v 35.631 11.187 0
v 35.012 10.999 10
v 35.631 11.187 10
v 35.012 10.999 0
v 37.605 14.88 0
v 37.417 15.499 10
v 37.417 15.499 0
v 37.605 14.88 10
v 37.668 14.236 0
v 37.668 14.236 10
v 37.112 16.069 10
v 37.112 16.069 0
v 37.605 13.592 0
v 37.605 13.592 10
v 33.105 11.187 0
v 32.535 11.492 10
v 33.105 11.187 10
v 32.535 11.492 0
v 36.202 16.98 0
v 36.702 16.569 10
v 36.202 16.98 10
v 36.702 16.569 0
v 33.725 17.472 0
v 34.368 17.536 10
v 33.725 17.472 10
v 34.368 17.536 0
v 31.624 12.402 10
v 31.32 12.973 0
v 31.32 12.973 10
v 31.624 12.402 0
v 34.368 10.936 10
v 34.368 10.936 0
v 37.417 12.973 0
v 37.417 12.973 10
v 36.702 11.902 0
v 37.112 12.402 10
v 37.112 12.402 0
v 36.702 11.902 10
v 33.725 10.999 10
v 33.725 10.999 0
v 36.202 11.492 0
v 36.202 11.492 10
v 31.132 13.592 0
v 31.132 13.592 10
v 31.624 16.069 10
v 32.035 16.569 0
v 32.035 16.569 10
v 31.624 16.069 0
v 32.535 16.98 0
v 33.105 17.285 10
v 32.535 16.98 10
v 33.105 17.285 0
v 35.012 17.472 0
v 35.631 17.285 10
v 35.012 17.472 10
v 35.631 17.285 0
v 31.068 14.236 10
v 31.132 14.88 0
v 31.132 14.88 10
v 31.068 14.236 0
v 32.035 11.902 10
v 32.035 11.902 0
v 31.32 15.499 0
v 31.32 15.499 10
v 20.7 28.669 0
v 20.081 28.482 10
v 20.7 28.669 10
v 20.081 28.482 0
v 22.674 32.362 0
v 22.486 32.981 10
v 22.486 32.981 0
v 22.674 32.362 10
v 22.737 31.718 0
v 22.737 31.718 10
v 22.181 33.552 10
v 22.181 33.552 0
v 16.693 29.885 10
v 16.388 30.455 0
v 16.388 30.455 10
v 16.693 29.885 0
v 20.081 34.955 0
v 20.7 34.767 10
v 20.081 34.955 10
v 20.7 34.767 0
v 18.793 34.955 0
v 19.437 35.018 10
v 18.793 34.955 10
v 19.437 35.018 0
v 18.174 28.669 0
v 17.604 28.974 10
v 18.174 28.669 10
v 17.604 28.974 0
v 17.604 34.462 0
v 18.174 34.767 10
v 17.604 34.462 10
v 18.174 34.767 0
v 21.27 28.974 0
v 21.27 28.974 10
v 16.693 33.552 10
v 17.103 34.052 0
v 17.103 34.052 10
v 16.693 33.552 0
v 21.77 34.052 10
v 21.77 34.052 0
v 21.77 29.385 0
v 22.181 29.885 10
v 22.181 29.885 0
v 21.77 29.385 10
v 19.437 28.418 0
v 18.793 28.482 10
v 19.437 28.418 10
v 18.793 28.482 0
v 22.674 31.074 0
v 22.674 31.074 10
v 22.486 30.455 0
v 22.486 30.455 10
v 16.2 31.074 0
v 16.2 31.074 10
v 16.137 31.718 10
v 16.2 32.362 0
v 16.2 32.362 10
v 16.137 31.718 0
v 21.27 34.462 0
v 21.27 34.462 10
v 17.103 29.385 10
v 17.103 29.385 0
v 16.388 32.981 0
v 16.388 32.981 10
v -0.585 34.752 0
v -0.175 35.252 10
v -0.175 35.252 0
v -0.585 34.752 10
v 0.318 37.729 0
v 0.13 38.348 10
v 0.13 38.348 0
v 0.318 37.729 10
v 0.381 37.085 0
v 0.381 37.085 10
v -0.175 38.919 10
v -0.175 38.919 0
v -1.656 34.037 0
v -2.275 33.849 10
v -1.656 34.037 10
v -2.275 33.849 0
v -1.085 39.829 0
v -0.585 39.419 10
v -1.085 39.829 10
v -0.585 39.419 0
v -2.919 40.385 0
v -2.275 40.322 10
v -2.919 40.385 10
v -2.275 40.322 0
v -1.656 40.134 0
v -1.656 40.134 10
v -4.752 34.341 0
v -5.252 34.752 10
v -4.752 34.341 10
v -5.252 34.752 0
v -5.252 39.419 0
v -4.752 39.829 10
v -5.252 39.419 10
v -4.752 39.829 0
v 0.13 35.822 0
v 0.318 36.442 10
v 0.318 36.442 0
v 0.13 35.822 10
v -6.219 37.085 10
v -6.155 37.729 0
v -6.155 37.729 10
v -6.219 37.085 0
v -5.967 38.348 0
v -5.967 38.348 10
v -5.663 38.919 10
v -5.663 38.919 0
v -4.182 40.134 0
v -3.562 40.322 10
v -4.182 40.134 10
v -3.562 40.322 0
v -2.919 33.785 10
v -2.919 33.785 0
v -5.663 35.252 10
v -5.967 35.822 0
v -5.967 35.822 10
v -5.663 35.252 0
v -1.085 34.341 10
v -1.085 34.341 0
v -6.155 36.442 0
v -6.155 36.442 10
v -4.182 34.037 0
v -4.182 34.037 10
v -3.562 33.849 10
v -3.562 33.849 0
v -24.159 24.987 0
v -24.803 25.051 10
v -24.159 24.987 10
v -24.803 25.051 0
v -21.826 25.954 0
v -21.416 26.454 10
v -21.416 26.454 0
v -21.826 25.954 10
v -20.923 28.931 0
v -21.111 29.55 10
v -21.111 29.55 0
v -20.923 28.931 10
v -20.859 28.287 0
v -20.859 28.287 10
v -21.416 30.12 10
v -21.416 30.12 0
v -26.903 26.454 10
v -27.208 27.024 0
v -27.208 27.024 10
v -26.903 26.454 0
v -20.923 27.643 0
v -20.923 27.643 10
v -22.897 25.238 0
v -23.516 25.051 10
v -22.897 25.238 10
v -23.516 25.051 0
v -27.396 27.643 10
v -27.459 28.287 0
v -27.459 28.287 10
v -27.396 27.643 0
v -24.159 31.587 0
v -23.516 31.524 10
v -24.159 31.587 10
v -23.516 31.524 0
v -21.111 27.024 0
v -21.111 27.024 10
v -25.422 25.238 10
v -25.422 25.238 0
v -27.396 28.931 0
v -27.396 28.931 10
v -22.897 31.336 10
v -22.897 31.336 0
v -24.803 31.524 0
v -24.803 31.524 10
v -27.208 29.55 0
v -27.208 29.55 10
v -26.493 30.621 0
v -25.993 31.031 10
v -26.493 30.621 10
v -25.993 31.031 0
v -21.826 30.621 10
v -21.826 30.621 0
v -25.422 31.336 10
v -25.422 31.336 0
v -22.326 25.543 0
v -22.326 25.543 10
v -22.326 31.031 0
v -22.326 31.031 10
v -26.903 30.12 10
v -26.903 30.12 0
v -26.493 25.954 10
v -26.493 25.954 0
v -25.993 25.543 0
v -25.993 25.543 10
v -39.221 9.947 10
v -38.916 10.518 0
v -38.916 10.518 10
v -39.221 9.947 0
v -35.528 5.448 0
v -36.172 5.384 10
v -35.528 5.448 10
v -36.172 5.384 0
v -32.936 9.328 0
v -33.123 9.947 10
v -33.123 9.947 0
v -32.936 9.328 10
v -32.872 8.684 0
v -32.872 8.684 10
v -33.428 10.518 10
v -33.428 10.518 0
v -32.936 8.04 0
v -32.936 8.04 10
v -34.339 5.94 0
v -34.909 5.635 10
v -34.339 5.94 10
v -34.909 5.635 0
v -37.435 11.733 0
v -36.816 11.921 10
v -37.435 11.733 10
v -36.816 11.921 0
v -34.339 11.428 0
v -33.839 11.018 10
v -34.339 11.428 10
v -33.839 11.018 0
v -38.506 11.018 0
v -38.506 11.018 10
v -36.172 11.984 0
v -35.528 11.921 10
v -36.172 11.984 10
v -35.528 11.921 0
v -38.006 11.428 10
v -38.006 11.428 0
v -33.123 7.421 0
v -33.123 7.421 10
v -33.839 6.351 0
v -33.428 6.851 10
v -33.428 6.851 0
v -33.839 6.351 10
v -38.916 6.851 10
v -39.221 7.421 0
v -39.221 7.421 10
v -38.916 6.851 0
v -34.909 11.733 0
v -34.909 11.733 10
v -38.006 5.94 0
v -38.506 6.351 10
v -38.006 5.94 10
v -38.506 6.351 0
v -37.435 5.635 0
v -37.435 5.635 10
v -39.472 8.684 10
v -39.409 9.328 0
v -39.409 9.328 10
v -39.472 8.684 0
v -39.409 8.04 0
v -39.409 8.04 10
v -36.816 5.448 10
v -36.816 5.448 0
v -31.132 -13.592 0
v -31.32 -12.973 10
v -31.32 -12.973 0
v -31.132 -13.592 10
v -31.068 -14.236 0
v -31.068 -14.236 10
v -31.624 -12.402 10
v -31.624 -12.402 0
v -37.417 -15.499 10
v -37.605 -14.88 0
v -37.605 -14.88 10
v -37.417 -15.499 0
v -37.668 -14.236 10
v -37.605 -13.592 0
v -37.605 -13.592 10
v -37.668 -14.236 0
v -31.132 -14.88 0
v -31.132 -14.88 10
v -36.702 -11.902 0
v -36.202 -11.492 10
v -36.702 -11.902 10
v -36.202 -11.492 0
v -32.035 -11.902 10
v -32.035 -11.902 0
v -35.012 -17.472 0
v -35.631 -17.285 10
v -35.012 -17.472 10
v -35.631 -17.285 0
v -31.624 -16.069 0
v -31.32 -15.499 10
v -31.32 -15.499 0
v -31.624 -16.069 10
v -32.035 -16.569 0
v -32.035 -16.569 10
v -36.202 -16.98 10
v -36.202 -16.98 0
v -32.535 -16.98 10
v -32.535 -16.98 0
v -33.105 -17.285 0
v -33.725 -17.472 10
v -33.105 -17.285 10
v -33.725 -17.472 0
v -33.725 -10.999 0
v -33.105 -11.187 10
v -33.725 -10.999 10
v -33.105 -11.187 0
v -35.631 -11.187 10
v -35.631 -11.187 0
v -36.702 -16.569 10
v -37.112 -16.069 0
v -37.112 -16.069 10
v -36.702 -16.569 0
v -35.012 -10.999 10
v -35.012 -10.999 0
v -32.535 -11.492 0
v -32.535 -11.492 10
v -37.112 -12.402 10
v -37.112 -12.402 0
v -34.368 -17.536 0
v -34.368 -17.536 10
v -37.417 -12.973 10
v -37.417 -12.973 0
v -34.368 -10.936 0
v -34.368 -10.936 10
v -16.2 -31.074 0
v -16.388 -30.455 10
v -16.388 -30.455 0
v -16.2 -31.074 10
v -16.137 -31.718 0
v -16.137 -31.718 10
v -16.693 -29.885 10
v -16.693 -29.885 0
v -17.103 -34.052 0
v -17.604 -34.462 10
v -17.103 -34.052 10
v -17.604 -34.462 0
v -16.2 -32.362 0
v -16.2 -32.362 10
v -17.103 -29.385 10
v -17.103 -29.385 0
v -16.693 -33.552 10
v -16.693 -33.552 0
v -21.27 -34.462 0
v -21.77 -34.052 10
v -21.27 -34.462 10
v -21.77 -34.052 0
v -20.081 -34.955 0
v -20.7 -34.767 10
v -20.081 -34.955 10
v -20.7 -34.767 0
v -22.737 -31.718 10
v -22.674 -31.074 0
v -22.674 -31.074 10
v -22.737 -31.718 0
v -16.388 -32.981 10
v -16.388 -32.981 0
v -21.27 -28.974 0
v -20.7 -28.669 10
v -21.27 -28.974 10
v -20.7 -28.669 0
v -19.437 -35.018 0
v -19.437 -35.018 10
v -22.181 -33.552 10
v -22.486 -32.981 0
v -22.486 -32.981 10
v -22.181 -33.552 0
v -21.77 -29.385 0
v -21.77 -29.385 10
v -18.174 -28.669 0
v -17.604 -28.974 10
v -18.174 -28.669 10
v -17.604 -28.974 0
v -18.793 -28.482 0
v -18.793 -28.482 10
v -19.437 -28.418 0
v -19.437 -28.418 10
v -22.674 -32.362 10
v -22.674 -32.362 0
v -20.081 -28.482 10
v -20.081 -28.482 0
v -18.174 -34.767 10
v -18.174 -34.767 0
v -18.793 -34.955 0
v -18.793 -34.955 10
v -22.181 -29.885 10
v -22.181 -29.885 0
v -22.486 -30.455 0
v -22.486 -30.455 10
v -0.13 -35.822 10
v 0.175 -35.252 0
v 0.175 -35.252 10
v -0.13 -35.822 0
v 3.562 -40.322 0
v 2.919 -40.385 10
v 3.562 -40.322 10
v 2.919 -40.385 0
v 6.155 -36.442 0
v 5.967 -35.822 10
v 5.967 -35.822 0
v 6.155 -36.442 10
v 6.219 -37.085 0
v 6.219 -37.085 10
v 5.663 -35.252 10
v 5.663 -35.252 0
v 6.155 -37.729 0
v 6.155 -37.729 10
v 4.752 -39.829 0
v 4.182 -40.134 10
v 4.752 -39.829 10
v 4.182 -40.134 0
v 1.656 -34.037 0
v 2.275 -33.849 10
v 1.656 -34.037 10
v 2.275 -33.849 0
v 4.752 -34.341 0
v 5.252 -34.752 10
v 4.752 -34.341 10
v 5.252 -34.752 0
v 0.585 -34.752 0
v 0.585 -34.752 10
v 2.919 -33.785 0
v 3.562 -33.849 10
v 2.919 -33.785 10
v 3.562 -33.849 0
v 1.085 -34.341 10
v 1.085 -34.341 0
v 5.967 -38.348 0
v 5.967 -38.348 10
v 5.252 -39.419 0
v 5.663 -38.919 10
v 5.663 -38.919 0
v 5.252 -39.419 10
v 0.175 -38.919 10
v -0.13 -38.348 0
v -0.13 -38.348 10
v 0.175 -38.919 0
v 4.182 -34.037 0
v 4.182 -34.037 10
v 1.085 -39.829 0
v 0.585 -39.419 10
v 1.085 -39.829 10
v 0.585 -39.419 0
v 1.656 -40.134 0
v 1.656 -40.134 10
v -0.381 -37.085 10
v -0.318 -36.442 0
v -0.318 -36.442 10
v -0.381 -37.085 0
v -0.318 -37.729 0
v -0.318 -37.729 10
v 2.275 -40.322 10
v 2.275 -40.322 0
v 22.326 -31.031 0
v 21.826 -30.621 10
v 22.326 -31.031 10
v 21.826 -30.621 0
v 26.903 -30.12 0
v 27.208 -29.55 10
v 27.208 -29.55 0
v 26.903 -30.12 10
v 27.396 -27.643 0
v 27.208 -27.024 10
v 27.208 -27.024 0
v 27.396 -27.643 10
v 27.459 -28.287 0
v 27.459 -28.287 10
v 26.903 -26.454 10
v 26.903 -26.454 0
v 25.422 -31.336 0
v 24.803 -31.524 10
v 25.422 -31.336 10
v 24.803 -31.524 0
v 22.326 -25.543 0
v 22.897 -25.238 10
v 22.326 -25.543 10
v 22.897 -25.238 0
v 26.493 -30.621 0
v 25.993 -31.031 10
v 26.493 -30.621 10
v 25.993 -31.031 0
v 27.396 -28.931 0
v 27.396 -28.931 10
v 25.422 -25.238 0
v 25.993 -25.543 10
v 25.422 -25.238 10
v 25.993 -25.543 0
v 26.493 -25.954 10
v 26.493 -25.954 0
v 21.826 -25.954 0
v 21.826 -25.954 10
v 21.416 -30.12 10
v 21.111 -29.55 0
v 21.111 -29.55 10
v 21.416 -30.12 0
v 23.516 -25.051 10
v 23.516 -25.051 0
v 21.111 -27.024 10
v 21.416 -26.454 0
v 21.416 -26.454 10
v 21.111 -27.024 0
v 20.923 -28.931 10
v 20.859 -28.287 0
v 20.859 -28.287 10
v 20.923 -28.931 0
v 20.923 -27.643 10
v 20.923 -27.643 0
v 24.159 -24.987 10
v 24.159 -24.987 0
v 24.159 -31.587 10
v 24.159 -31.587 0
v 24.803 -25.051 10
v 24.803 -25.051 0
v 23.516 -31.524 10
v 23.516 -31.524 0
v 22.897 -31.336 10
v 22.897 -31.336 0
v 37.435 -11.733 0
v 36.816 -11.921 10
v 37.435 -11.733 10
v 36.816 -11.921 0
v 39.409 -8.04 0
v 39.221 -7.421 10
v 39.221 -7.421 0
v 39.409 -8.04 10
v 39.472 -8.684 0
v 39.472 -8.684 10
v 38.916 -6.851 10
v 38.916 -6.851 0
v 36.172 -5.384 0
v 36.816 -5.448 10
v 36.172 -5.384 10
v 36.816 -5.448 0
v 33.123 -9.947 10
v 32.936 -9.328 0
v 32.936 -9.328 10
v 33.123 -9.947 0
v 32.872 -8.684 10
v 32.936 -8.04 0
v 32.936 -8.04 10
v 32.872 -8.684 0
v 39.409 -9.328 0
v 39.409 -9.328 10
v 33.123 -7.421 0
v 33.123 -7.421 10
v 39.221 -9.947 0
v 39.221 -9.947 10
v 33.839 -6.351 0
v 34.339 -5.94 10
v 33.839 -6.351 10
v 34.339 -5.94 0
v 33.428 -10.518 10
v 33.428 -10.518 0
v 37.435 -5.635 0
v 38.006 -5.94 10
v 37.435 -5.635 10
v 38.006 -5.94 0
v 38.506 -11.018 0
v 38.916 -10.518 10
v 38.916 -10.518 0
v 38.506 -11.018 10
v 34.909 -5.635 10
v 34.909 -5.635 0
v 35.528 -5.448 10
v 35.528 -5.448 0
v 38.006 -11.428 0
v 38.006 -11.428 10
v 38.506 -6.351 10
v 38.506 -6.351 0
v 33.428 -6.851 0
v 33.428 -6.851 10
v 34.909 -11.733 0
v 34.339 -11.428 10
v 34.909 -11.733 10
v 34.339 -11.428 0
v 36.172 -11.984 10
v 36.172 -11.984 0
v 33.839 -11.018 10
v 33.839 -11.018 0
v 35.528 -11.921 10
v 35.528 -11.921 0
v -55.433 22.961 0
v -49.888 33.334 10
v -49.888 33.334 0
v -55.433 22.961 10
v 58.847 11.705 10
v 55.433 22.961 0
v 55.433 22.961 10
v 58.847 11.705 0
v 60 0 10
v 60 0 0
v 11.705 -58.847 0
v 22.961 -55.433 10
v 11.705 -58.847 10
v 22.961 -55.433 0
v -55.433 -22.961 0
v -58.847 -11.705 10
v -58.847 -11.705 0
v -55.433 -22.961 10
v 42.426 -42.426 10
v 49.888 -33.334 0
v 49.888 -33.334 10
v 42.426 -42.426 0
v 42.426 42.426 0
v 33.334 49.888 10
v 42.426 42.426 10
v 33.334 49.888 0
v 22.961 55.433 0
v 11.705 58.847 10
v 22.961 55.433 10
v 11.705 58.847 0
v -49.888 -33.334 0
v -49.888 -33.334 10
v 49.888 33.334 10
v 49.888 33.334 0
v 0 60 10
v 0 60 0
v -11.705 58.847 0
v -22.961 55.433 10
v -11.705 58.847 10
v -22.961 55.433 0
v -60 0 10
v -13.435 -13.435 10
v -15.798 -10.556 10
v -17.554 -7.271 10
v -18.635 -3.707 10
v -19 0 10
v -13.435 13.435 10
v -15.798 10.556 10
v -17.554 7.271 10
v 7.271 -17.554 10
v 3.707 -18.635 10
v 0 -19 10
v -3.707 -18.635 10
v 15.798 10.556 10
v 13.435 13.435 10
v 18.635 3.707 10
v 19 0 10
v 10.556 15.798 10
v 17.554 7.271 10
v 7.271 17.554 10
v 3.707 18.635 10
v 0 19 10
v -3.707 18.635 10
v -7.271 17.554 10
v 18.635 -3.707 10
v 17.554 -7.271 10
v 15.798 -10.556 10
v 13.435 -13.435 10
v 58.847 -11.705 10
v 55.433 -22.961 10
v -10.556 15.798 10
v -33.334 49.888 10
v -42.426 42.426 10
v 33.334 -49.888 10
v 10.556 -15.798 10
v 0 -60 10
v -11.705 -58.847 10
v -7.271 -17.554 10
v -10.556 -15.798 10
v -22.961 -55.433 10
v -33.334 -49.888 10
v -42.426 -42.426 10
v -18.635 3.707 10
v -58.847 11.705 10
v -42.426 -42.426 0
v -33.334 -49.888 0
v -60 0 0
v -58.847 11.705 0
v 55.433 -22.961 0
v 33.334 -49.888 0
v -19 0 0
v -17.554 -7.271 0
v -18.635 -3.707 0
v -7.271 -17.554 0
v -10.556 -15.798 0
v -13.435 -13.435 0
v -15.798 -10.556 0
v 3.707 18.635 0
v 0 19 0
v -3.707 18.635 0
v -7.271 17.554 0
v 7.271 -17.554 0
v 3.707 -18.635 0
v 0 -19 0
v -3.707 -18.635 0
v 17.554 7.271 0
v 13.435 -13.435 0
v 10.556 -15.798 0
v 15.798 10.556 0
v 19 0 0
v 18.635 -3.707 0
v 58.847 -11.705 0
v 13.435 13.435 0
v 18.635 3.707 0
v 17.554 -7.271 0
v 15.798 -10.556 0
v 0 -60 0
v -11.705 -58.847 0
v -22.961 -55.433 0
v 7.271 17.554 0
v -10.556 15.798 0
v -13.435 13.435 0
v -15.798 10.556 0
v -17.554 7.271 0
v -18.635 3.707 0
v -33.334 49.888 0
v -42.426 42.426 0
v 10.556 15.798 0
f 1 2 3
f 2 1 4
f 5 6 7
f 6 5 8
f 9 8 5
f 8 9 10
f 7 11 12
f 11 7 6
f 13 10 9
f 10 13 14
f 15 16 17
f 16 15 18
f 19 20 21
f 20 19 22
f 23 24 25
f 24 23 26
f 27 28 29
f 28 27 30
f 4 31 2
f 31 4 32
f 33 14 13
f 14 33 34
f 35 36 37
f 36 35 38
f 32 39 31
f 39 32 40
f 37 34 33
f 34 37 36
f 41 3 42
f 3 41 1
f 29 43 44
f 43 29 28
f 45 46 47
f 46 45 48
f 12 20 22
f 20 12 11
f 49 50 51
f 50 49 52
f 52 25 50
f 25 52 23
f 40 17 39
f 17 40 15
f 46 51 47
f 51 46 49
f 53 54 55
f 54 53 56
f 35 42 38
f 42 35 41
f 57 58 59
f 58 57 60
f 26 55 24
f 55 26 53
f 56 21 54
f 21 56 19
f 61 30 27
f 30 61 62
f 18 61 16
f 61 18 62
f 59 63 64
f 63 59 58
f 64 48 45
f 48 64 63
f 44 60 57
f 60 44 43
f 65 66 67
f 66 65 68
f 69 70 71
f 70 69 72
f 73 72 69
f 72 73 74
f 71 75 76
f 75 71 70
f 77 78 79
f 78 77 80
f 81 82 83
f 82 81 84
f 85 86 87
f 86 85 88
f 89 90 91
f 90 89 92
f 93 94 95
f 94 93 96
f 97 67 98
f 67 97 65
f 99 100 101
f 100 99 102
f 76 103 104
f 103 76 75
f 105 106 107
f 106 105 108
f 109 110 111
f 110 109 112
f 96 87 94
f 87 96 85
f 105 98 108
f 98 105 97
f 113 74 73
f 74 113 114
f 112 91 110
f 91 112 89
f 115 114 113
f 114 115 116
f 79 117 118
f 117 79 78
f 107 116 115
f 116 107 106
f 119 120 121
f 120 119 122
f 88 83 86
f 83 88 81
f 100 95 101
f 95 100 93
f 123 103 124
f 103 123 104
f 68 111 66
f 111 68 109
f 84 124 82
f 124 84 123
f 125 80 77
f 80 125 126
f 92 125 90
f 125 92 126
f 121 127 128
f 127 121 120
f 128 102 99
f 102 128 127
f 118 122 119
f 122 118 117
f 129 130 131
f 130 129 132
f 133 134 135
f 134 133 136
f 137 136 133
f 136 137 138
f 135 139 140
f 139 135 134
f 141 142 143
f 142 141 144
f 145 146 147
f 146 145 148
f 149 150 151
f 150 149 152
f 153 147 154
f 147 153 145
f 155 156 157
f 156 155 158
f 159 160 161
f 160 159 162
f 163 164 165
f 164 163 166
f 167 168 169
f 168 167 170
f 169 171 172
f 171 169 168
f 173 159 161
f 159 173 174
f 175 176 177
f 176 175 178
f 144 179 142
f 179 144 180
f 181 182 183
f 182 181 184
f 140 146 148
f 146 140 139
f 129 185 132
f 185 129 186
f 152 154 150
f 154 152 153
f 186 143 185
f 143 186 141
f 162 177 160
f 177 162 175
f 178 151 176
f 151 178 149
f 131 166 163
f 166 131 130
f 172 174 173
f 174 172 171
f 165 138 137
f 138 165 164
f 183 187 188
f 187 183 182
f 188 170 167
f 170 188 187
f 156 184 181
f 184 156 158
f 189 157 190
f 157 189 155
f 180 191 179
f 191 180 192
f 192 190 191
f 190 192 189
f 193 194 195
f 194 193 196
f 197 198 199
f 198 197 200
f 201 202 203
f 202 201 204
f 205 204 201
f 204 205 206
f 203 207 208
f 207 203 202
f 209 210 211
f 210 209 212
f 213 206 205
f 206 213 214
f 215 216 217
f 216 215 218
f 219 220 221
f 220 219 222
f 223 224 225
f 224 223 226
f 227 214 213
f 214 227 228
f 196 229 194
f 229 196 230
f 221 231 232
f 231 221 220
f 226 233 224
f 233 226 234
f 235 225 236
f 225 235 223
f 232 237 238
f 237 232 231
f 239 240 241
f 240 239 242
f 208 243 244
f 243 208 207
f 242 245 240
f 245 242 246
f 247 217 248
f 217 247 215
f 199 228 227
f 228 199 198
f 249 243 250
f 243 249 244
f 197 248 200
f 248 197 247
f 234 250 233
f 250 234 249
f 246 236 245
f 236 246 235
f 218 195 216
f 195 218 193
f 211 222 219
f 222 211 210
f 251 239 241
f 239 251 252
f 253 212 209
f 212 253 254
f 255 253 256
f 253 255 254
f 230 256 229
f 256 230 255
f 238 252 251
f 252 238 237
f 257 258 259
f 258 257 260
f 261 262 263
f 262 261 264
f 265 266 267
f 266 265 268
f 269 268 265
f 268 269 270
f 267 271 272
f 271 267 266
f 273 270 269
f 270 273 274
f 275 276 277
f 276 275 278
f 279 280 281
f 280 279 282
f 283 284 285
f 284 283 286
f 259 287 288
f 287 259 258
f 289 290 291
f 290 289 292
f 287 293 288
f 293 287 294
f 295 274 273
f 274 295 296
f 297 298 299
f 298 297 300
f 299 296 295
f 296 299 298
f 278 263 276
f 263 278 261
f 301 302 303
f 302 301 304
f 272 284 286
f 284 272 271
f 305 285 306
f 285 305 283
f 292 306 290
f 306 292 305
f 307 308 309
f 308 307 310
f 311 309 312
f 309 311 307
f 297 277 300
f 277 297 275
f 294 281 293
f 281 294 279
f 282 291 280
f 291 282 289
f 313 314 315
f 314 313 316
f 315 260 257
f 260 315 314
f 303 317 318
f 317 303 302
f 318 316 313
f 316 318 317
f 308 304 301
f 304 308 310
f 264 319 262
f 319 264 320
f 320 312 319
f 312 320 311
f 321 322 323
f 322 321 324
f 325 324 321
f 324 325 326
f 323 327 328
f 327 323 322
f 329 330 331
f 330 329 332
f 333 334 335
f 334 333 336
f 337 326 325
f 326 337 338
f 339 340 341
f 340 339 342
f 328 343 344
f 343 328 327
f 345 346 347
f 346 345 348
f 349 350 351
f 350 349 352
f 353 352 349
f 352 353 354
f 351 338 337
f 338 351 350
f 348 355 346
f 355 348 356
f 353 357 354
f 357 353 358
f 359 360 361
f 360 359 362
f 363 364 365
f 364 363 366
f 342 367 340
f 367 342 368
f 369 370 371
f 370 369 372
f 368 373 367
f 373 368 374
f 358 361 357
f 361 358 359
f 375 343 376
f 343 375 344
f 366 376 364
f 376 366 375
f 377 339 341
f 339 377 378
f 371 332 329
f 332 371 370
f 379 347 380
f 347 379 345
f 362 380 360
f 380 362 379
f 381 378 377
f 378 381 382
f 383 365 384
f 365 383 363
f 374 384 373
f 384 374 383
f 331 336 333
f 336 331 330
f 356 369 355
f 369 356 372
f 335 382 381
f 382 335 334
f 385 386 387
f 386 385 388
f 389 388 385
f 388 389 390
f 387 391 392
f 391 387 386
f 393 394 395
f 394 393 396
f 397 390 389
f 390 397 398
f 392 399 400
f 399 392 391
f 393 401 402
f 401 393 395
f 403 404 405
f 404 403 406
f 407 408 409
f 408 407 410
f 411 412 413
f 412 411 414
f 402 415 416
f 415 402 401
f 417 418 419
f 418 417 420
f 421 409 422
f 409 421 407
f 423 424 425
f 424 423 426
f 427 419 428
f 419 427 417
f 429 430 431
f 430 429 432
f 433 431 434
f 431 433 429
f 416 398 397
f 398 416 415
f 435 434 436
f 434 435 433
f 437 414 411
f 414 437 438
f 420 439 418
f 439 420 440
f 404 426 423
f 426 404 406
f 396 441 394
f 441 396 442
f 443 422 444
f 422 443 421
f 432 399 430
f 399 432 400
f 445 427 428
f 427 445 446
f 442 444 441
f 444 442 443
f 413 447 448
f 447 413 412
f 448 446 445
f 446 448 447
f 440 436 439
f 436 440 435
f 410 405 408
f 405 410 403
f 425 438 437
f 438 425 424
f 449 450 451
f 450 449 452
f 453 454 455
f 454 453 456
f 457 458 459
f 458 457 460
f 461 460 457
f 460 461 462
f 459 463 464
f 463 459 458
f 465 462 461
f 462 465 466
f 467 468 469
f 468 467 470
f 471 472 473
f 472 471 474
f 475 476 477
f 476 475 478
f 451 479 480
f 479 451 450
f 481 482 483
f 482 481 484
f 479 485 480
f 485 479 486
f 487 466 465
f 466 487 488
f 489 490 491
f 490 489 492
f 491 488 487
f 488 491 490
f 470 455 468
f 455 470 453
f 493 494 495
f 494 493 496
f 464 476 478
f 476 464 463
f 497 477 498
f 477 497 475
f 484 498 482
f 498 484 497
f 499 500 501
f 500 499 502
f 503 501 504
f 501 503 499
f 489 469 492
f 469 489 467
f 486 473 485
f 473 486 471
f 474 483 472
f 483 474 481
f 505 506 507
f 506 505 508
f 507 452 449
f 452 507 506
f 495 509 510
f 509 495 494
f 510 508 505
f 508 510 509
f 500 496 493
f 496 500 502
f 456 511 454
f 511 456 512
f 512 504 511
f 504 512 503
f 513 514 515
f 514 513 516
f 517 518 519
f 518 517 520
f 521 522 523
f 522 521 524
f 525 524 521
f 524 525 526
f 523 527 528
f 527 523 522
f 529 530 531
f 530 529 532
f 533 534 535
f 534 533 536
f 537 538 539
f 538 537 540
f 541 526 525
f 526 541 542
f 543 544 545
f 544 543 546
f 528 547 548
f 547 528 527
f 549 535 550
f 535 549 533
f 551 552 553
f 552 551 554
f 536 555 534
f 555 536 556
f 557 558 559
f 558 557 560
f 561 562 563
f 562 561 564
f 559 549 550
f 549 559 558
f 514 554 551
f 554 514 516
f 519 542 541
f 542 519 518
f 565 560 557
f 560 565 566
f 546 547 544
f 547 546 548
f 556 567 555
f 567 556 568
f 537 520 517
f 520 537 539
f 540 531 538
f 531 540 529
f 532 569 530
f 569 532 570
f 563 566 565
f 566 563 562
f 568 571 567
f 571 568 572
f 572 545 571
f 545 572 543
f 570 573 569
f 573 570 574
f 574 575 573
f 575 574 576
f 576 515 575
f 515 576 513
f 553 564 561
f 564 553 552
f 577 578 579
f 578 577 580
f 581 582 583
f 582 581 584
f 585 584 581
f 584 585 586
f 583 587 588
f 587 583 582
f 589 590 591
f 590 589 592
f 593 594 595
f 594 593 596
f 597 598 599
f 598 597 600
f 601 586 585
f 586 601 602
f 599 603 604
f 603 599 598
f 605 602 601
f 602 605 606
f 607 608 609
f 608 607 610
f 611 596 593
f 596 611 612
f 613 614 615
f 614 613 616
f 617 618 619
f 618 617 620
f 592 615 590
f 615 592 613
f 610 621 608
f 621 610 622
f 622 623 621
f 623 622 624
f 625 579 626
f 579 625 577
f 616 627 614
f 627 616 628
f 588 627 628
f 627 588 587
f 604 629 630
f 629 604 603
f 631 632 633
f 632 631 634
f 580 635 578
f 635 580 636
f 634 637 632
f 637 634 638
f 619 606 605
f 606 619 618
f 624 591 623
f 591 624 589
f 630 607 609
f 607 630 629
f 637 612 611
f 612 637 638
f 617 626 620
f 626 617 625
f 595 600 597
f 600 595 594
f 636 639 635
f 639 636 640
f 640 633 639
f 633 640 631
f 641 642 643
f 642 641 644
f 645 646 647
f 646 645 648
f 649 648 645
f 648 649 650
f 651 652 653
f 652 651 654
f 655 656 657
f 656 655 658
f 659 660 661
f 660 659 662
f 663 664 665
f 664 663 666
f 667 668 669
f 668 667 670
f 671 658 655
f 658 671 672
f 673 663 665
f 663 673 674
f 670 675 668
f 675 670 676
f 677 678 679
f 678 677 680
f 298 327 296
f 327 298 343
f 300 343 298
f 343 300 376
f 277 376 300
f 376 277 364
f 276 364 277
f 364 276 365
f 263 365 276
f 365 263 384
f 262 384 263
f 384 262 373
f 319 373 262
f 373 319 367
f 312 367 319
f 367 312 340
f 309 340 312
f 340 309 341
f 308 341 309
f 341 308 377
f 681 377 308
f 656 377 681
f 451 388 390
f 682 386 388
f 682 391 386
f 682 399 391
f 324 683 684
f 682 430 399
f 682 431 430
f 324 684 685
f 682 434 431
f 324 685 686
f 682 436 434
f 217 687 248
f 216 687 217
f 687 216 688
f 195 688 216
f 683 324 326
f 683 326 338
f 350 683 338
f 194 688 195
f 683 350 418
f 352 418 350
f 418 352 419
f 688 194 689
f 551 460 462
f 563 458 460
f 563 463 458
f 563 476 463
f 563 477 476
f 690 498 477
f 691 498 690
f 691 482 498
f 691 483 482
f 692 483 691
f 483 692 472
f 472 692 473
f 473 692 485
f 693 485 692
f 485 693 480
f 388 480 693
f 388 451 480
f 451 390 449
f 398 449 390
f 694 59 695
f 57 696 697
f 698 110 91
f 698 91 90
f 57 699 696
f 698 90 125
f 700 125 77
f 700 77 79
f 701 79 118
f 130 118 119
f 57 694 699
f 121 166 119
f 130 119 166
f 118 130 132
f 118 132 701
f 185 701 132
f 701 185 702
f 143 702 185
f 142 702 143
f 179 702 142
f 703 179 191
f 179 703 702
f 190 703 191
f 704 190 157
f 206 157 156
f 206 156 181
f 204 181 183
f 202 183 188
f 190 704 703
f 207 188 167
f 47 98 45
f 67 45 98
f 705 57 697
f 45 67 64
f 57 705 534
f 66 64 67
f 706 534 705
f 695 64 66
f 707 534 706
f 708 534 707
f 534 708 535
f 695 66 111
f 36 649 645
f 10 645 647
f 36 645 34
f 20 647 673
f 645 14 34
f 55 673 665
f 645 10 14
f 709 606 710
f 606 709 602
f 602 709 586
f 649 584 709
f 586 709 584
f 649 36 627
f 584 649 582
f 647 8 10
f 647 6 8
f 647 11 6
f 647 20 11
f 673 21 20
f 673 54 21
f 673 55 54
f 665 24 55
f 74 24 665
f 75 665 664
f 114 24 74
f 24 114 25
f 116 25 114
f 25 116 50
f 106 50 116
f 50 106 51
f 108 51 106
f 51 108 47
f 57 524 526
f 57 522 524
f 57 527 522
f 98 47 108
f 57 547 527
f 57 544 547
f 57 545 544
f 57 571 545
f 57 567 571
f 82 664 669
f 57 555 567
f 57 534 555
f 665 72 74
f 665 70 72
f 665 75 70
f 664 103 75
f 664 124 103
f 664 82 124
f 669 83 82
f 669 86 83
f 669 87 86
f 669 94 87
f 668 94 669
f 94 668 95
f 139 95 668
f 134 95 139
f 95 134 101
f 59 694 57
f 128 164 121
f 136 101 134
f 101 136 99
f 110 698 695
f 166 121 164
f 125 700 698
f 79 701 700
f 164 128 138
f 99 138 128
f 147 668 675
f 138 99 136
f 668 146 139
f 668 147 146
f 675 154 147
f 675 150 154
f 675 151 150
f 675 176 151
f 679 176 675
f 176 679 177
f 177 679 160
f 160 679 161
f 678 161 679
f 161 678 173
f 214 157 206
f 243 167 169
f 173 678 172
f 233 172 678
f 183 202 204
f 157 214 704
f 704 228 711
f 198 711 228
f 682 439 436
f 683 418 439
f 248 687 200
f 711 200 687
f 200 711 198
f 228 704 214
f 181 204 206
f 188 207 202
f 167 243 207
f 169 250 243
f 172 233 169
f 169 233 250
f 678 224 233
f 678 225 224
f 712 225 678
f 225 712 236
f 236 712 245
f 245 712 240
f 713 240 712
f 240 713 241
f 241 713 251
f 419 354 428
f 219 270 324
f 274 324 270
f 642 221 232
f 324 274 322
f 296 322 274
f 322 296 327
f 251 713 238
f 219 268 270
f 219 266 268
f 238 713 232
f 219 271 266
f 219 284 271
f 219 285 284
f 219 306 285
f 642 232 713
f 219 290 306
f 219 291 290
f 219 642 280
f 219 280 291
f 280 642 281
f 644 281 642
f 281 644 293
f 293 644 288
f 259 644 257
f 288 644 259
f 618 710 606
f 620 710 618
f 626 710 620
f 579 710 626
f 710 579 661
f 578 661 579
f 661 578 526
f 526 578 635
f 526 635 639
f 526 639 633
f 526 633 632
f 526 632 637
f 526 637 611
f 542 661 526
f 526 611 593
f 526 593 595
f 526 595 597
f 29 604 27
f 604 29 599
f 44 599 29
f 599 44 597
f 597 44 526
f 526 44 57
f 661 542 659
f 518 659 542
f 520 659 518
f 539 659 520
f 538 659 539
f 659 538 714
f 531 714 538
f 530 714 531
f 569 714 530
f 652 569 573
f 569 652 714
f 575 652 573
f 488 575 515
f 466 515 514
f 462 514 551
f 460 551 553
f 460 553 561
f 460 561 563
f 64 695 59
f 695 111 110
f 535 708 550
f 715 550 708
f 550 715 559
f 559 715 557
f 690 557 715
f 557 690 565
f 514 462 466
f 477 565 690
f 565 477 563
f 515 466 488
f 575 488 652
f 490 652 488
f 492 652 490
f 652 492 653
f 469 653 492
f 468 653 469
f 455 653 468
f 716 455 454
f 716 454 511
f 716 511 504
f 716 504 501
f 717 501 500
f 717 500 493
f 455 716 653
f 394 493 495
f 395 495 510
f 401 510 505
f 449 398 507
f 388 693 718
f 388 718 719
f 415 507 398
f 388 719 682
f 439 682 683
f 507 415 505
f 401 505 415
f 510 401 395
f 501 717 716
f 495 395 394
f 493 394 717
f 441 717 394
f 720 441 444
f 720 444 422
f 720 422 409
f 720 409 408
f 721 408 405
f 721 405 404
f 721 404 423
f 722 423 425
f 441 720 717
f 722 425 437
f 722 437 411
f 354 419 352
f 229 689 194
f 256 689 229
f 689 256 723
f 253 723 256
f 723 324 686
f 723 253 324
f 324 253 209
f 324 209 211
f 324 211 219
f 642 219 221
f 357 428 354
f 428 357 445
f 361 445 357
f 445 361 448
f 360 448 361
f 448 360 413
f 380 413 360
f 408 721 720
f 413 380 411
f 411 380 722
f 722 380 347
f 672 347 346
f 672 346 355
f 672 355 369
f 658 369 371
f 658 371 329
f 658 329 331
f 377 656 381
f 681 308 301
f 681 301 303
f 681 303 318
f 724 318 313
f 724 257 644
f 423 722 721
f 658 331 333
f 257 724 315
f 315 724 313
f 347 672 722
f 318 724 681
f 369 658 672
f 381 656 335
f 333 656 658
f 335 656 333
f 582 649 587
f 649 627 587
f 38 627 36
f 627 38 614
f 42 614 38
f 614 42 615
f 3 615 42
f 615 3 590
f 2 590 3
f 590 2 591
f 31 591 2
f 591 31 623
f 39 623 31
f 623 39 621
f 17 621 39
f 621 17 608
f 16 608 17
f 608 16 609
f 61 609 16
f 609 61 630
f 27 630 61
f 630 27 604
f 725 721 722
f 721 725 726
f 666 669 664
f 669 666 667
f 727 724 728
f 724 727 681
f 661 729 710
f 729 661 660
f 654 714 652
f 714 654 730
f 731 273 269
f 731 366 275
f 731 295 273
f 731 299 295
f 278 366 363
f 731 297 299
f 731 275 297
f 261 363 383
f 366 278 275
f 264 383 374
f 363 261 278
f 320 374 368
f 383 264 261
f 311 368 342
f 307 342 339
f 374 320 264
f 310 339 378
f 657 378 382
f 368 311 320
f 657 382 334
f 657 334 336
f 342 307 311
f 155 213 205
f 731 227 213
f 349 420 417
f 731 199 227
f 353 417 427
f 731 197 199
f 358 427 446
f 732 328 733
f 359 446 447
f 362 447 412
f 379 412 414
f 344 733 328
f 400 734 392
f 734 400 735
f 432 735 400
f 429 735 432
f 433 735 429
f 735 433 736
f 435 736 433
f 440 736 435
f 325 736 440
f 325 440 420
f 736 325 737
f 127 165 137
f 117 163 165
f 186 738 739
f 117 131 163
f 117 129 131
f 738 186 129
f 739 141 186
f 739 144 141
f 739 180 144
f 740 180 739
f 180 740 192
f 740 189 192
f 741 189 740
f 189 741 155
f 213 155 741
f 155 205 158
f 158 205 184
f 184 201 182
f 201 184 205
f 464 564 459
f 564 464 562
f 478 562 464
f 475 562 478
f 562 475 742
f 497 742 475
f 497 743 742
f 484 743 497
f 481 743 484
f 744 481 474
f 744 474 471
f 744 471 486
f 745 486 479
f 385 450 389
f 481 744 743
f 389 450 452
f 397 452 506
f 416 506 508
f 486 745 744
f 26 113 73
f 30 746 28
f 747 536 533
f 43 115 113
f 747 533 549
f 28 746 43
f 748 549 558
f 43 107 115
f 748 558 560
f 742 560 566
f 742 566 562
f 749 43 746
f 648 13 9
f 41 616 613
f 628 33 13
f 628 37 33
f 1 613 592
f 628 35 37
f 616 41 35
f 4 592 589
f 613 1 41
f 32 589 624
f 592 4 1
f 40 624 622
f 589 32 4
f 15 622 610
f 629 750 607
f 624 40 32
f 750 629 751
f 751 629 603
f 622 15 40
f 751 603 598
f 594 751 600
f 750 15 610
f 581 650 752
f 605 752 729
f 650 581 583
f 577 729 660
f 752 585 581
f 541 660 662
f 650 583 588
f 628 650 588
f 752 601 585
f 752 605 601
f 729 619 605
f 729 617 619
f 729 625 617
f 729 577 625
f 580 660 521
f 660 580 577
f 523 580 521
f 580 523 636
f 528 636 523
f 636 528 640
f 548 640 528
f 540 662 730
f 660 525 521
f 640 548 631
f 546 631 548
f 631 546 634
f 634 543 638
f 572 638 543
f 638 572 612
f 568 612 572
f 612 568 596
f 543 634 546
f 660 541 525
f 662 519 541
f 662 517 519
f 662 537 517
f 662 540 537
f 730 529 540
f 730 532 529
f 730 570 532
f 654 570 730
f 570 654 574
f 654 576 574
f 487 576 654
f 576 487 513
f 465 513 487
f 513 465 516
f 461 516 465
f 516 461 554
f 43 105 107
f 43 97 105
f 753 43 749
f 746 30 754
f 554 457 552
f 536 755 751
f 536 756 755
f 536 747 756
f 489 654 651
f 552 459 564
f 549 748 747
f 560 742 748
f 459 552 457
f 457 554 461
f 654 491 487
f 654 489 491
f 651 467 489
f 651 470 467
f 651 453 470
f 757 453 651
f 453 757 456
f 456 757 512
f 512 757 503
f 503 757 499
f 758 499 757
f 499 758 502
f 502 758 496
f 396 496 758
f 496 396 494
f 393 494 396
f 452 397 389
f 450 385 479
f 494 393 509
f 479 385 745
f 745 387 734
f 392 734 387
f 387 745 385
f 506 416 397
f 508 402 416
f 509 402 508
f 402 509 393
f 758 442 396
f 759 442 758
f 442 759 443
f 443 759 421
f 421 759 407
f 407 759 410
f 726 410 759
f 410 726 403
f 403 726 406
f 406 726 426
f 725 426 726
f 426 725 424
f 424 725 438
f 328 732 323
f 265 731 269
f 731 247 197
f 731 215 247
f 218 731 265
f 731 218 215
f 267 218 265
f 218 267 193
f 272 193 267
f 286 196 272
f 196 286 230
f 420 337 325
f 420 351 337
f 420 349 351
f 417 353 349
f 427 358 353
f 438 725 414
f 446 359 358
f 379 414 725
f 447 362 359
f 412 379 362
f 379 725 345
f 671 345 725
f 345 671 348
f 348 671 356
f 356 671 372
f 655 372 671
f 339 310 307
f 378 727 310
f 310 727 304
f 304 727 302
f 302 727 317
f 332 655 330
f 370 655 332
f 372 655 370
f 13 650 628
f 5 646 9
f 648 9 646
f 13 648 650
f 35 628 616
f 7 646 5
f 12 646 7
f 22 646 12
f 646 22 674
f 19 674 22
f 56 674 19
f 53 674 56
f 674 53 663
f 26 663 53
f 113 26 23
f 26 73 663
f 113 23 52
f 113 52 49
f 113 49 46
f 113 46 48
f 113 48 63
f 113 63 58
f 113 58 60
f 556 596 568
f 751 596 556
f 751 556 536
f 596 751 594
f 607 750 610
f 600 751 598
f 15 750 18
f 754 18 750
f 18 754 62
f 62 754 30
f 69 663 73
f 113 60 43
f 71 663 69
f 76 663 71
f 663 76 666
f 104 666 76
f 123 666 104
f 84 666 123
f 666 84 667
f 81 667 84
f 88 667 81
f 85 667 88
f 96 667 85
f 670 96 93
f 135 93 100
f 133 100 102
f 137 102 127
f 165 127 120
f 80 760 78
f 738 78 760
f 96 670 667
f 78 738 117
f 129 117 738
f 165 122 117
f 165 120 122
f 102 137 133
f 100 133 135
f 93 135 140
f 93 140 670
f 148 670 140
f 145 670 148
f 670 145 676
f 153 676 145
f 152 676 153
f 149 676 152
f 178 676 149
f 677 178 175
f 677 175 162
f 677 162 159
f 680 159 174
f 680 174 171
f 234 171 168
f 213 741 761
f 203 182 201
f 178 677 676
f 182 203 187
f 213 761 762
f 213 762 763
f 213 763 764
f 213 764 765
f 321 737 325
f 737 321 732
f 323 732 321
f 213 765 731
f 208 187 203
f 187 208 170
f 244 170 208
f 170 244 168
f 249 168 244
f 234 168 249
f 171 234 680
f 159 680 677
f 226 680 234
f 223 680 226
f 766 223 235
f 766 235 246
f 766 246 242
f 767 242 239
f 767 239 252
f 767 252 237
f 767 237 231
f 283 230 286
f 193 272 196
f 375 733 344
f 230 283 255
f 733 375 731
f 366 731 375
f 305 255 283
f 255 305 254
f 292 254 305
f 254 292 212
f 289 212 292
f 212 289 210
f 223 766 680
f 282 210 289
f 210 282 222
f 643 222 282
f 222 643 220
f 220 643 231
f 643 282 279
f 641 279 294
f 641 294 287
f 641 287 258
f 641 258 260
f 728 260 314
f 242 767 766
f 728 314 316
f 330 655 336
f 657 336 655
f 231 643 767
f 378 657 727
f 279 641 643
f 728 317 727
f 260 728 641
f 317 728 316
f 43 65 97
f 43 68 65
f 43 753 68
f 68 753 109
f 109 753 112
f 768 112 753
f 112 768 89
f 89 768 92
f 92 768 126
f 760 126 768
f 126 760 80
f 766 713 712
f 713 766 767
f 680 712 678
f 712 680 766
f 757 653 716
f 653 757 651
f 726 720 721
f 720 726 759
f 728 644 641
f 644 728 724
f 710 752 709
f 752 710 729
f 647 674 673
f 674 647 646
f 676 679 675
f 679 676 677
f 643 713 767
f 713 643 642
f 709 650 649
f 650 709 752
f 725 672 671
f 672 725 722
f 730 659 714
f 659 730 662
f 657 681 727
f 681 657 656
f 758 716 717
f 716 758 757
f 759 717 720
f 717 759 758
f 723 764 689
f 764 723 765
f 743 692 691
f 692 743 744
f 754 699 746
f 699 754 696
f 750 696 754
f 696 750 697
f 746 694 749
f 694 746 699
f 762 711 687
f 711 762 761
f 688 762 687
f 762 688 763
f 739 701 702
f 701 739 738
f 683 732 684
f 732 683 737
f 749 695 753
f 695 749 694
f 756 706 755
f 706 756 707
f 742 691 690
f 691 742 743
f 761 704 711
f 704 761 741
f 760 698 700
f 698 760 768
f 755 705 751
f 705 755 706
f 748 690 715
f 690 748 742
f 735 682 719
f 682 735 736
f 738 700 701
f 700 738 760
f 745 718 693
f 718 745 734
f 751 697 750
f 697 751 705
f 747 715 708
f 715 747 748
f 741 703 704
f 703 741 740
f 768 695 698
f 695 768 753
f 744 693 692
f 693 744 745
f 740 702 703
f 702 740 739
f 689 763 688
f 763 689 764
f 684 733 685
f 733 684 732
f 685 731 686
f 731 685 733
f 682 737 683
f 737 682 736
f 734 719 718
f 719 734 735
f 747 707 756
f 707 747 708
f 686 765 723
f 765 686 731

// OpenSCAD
$fn = 32;

// ----------------------------------------------------------------------
// Flange Ø120 x 10
// 10 holes on a Ø74.4 bolt circle, bolted joints
// ----------------------------------------------------------------------

// --- parameters (mm) ---
flange_d = 120;    // outside diameter of the flange
thickness = 10;    // flange thickness
holes = 10;        // number of bolt holes
pcd = 74.4;        // bolt circle diameter
start_deg = 22.5;  // angle of the first hole, from +X
hole_d = 6.6;      // bolt hole diameter
bore_d = 38;       // central through bore
hub_d = 50;        // hub outside diameter
hub_h = 0;         // hub height above the flange face (0 = no hub)

// --- derived feature positions (mm) ---
height = thickness + hub_h;  // = 10   overall height of the part
pcd_r = pcd / 2;             // = 37.2   bolt circle radius
hole_step = 360 / holes;     // = 36   angular pitch
feature_centers = [
  [pcd_r * cos(start_deg + 0 * hole_step), pcd_r * sin(start_deg + 0 * hole_step)],
  [pcd_r * cos(start_deg + 1 * hole_step), pcd_r * sin(start_deg + 1 * hole_step)],
  [pcd_r * cos(start_deg + 2 * hole_step), pcd_r * sin(start_deg + 2 * hole_step)],
  [pcd_r * cos(start_deg + 3 * hole_step), pcd_r * sin(start_deg + 3 * hole_step)],
  [pcd_r * cos(start_deg + 4 * hole_step), pcd_r * sin(start_deg + 4 * hole_step)],
  [pcd_r * cos(start_deg + 5 * hole_step), pcd_r * sin(start_deg + 5 * hole_step)],
  [pcd_r * cos(start_deg + 6 * hole_step), pcd_r * sin(start_deg + 6 * hole_step)],
  [pcd_r * cos(start_deg + 7 * hole_step), pcd_r * sin(start_deg + 7 * hole_step)],
  [pcd_r * cos(start_deg + 8 * hole_step), pcd_r * sin(start_deg + 8 * hole_step)],
  [pcd_r * cos(start_deg + 9 * hole_step), pcd_r * sin(start_deg + 9 * hole_step)]
];   // bolt hole centres on the pitch circle

// flange disc, every hole and the bore cut straight through
difference() {
  union() {
    cylinder(d = flange_d, h = thickness);
  }
  translate([0, 0, -1]) cylinder(d = bore_d, h = height + 2);  // bore, through
  for (centre = feature_centers)
    translate([centre[0], centre[1], -1]) cylinder(d = hole_d, h = thickness + 2);
}
